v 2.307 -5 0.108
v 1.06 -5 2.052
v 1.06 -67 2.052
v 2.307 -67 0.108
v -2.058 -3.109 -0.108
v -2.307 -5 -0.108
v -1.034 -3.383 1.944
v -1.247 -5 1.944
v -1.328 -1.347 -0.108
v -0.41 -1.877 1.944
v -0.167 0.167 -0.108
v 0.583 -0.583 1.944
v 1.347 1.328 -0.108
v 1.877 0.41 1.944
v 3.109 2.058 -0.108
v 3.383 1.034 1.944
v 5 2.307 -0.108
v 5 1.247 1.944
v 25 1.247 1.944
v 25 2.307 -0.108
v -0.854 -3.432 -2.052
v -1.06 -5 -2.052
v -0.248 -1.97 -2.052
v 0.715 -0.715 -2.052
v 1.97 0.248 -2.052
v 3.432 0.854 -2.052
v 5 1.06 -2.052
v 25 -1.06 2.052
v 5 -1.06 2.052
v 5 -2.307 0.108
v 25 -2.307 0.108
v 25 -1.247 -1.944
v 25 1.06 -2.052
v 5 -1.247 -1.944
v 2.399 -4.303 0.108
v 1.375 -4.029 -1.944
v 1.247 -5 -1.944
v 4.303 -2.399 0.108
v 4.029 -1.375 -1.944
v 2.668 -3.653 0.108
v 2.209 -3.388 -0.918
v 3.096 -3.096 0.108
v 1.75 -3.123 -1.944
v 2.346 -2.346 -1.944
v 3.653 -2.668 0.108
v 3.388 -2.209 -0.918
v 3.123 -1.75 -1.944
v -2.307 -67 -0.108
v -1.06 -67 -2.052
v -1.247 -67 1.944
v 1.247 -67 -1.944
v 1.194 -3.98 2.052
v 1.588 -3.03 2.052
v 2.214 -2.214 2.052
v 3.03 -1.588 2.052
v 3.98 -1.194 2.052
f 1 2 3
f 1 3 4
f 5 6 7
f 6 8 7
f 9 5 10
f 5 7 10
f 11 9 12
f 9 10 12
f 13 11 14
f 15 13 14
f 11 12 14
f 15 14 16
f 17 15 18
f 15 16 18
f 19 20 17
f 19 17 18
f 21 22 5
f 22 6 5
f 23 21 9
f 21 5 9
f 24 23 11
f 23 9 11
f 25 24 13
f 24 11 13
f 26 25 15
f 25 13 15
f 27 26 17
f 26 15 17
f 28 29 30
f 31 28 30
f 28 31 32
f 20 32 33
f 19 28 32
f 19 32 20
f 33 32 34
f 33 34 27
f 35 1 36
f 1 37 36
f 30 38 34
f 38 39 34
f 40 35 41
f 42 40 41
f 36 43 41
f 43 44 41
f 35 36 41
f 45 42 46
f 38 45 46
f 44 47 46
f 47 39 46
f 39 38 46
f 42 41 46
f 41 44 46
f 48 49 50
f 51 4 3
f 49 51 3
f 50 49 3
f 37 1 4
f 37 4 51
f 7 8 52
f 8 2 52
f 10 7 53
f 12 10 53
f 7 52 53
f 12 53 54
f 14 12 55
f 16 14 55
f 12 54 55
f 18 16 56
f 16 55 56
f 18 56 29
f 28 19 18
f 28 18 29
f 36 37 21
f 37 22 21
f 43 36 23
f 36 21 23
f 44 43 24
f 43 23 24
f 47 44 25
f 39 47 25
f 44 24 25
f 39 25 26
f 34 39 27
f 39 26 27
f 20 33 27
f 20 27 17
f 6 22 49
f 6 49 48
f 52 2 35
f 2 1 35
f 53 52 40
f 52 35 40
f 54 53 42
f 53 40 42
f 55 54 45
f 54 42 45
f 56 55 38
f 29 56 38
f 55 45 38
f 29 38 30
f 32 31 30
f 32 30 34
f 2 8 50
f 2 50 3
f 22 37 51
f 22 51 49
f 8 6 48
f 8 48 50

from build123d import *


with BuildPart() as f3:
    # F3: sweep along a path in F0
    with BuildLine(Plane.XY) as f3_path:
        Line((0, -67), (0, -5))
        ThreePointArc((0, -5), (1.464466, -1.464466), (5, 0))
        Line((5, 0), (25, 0))
    # F2 (on face) → F3 (sweep)
    with BuildSketch(Plane(origin=(0, -67, 0), x_dir=(-1, 0, 0), z_dir=(0, 1, 0))):
        Polygon((-1.059994, 2.051766), (-2.306879, 0.107901), (-1.246885, -1.943865), (1.059994, -2.051766), (2.306879, -0.107901), (1.246885, 1.943865), align=None)
    sweep(path=f3_path.line)


solid = f3.part
